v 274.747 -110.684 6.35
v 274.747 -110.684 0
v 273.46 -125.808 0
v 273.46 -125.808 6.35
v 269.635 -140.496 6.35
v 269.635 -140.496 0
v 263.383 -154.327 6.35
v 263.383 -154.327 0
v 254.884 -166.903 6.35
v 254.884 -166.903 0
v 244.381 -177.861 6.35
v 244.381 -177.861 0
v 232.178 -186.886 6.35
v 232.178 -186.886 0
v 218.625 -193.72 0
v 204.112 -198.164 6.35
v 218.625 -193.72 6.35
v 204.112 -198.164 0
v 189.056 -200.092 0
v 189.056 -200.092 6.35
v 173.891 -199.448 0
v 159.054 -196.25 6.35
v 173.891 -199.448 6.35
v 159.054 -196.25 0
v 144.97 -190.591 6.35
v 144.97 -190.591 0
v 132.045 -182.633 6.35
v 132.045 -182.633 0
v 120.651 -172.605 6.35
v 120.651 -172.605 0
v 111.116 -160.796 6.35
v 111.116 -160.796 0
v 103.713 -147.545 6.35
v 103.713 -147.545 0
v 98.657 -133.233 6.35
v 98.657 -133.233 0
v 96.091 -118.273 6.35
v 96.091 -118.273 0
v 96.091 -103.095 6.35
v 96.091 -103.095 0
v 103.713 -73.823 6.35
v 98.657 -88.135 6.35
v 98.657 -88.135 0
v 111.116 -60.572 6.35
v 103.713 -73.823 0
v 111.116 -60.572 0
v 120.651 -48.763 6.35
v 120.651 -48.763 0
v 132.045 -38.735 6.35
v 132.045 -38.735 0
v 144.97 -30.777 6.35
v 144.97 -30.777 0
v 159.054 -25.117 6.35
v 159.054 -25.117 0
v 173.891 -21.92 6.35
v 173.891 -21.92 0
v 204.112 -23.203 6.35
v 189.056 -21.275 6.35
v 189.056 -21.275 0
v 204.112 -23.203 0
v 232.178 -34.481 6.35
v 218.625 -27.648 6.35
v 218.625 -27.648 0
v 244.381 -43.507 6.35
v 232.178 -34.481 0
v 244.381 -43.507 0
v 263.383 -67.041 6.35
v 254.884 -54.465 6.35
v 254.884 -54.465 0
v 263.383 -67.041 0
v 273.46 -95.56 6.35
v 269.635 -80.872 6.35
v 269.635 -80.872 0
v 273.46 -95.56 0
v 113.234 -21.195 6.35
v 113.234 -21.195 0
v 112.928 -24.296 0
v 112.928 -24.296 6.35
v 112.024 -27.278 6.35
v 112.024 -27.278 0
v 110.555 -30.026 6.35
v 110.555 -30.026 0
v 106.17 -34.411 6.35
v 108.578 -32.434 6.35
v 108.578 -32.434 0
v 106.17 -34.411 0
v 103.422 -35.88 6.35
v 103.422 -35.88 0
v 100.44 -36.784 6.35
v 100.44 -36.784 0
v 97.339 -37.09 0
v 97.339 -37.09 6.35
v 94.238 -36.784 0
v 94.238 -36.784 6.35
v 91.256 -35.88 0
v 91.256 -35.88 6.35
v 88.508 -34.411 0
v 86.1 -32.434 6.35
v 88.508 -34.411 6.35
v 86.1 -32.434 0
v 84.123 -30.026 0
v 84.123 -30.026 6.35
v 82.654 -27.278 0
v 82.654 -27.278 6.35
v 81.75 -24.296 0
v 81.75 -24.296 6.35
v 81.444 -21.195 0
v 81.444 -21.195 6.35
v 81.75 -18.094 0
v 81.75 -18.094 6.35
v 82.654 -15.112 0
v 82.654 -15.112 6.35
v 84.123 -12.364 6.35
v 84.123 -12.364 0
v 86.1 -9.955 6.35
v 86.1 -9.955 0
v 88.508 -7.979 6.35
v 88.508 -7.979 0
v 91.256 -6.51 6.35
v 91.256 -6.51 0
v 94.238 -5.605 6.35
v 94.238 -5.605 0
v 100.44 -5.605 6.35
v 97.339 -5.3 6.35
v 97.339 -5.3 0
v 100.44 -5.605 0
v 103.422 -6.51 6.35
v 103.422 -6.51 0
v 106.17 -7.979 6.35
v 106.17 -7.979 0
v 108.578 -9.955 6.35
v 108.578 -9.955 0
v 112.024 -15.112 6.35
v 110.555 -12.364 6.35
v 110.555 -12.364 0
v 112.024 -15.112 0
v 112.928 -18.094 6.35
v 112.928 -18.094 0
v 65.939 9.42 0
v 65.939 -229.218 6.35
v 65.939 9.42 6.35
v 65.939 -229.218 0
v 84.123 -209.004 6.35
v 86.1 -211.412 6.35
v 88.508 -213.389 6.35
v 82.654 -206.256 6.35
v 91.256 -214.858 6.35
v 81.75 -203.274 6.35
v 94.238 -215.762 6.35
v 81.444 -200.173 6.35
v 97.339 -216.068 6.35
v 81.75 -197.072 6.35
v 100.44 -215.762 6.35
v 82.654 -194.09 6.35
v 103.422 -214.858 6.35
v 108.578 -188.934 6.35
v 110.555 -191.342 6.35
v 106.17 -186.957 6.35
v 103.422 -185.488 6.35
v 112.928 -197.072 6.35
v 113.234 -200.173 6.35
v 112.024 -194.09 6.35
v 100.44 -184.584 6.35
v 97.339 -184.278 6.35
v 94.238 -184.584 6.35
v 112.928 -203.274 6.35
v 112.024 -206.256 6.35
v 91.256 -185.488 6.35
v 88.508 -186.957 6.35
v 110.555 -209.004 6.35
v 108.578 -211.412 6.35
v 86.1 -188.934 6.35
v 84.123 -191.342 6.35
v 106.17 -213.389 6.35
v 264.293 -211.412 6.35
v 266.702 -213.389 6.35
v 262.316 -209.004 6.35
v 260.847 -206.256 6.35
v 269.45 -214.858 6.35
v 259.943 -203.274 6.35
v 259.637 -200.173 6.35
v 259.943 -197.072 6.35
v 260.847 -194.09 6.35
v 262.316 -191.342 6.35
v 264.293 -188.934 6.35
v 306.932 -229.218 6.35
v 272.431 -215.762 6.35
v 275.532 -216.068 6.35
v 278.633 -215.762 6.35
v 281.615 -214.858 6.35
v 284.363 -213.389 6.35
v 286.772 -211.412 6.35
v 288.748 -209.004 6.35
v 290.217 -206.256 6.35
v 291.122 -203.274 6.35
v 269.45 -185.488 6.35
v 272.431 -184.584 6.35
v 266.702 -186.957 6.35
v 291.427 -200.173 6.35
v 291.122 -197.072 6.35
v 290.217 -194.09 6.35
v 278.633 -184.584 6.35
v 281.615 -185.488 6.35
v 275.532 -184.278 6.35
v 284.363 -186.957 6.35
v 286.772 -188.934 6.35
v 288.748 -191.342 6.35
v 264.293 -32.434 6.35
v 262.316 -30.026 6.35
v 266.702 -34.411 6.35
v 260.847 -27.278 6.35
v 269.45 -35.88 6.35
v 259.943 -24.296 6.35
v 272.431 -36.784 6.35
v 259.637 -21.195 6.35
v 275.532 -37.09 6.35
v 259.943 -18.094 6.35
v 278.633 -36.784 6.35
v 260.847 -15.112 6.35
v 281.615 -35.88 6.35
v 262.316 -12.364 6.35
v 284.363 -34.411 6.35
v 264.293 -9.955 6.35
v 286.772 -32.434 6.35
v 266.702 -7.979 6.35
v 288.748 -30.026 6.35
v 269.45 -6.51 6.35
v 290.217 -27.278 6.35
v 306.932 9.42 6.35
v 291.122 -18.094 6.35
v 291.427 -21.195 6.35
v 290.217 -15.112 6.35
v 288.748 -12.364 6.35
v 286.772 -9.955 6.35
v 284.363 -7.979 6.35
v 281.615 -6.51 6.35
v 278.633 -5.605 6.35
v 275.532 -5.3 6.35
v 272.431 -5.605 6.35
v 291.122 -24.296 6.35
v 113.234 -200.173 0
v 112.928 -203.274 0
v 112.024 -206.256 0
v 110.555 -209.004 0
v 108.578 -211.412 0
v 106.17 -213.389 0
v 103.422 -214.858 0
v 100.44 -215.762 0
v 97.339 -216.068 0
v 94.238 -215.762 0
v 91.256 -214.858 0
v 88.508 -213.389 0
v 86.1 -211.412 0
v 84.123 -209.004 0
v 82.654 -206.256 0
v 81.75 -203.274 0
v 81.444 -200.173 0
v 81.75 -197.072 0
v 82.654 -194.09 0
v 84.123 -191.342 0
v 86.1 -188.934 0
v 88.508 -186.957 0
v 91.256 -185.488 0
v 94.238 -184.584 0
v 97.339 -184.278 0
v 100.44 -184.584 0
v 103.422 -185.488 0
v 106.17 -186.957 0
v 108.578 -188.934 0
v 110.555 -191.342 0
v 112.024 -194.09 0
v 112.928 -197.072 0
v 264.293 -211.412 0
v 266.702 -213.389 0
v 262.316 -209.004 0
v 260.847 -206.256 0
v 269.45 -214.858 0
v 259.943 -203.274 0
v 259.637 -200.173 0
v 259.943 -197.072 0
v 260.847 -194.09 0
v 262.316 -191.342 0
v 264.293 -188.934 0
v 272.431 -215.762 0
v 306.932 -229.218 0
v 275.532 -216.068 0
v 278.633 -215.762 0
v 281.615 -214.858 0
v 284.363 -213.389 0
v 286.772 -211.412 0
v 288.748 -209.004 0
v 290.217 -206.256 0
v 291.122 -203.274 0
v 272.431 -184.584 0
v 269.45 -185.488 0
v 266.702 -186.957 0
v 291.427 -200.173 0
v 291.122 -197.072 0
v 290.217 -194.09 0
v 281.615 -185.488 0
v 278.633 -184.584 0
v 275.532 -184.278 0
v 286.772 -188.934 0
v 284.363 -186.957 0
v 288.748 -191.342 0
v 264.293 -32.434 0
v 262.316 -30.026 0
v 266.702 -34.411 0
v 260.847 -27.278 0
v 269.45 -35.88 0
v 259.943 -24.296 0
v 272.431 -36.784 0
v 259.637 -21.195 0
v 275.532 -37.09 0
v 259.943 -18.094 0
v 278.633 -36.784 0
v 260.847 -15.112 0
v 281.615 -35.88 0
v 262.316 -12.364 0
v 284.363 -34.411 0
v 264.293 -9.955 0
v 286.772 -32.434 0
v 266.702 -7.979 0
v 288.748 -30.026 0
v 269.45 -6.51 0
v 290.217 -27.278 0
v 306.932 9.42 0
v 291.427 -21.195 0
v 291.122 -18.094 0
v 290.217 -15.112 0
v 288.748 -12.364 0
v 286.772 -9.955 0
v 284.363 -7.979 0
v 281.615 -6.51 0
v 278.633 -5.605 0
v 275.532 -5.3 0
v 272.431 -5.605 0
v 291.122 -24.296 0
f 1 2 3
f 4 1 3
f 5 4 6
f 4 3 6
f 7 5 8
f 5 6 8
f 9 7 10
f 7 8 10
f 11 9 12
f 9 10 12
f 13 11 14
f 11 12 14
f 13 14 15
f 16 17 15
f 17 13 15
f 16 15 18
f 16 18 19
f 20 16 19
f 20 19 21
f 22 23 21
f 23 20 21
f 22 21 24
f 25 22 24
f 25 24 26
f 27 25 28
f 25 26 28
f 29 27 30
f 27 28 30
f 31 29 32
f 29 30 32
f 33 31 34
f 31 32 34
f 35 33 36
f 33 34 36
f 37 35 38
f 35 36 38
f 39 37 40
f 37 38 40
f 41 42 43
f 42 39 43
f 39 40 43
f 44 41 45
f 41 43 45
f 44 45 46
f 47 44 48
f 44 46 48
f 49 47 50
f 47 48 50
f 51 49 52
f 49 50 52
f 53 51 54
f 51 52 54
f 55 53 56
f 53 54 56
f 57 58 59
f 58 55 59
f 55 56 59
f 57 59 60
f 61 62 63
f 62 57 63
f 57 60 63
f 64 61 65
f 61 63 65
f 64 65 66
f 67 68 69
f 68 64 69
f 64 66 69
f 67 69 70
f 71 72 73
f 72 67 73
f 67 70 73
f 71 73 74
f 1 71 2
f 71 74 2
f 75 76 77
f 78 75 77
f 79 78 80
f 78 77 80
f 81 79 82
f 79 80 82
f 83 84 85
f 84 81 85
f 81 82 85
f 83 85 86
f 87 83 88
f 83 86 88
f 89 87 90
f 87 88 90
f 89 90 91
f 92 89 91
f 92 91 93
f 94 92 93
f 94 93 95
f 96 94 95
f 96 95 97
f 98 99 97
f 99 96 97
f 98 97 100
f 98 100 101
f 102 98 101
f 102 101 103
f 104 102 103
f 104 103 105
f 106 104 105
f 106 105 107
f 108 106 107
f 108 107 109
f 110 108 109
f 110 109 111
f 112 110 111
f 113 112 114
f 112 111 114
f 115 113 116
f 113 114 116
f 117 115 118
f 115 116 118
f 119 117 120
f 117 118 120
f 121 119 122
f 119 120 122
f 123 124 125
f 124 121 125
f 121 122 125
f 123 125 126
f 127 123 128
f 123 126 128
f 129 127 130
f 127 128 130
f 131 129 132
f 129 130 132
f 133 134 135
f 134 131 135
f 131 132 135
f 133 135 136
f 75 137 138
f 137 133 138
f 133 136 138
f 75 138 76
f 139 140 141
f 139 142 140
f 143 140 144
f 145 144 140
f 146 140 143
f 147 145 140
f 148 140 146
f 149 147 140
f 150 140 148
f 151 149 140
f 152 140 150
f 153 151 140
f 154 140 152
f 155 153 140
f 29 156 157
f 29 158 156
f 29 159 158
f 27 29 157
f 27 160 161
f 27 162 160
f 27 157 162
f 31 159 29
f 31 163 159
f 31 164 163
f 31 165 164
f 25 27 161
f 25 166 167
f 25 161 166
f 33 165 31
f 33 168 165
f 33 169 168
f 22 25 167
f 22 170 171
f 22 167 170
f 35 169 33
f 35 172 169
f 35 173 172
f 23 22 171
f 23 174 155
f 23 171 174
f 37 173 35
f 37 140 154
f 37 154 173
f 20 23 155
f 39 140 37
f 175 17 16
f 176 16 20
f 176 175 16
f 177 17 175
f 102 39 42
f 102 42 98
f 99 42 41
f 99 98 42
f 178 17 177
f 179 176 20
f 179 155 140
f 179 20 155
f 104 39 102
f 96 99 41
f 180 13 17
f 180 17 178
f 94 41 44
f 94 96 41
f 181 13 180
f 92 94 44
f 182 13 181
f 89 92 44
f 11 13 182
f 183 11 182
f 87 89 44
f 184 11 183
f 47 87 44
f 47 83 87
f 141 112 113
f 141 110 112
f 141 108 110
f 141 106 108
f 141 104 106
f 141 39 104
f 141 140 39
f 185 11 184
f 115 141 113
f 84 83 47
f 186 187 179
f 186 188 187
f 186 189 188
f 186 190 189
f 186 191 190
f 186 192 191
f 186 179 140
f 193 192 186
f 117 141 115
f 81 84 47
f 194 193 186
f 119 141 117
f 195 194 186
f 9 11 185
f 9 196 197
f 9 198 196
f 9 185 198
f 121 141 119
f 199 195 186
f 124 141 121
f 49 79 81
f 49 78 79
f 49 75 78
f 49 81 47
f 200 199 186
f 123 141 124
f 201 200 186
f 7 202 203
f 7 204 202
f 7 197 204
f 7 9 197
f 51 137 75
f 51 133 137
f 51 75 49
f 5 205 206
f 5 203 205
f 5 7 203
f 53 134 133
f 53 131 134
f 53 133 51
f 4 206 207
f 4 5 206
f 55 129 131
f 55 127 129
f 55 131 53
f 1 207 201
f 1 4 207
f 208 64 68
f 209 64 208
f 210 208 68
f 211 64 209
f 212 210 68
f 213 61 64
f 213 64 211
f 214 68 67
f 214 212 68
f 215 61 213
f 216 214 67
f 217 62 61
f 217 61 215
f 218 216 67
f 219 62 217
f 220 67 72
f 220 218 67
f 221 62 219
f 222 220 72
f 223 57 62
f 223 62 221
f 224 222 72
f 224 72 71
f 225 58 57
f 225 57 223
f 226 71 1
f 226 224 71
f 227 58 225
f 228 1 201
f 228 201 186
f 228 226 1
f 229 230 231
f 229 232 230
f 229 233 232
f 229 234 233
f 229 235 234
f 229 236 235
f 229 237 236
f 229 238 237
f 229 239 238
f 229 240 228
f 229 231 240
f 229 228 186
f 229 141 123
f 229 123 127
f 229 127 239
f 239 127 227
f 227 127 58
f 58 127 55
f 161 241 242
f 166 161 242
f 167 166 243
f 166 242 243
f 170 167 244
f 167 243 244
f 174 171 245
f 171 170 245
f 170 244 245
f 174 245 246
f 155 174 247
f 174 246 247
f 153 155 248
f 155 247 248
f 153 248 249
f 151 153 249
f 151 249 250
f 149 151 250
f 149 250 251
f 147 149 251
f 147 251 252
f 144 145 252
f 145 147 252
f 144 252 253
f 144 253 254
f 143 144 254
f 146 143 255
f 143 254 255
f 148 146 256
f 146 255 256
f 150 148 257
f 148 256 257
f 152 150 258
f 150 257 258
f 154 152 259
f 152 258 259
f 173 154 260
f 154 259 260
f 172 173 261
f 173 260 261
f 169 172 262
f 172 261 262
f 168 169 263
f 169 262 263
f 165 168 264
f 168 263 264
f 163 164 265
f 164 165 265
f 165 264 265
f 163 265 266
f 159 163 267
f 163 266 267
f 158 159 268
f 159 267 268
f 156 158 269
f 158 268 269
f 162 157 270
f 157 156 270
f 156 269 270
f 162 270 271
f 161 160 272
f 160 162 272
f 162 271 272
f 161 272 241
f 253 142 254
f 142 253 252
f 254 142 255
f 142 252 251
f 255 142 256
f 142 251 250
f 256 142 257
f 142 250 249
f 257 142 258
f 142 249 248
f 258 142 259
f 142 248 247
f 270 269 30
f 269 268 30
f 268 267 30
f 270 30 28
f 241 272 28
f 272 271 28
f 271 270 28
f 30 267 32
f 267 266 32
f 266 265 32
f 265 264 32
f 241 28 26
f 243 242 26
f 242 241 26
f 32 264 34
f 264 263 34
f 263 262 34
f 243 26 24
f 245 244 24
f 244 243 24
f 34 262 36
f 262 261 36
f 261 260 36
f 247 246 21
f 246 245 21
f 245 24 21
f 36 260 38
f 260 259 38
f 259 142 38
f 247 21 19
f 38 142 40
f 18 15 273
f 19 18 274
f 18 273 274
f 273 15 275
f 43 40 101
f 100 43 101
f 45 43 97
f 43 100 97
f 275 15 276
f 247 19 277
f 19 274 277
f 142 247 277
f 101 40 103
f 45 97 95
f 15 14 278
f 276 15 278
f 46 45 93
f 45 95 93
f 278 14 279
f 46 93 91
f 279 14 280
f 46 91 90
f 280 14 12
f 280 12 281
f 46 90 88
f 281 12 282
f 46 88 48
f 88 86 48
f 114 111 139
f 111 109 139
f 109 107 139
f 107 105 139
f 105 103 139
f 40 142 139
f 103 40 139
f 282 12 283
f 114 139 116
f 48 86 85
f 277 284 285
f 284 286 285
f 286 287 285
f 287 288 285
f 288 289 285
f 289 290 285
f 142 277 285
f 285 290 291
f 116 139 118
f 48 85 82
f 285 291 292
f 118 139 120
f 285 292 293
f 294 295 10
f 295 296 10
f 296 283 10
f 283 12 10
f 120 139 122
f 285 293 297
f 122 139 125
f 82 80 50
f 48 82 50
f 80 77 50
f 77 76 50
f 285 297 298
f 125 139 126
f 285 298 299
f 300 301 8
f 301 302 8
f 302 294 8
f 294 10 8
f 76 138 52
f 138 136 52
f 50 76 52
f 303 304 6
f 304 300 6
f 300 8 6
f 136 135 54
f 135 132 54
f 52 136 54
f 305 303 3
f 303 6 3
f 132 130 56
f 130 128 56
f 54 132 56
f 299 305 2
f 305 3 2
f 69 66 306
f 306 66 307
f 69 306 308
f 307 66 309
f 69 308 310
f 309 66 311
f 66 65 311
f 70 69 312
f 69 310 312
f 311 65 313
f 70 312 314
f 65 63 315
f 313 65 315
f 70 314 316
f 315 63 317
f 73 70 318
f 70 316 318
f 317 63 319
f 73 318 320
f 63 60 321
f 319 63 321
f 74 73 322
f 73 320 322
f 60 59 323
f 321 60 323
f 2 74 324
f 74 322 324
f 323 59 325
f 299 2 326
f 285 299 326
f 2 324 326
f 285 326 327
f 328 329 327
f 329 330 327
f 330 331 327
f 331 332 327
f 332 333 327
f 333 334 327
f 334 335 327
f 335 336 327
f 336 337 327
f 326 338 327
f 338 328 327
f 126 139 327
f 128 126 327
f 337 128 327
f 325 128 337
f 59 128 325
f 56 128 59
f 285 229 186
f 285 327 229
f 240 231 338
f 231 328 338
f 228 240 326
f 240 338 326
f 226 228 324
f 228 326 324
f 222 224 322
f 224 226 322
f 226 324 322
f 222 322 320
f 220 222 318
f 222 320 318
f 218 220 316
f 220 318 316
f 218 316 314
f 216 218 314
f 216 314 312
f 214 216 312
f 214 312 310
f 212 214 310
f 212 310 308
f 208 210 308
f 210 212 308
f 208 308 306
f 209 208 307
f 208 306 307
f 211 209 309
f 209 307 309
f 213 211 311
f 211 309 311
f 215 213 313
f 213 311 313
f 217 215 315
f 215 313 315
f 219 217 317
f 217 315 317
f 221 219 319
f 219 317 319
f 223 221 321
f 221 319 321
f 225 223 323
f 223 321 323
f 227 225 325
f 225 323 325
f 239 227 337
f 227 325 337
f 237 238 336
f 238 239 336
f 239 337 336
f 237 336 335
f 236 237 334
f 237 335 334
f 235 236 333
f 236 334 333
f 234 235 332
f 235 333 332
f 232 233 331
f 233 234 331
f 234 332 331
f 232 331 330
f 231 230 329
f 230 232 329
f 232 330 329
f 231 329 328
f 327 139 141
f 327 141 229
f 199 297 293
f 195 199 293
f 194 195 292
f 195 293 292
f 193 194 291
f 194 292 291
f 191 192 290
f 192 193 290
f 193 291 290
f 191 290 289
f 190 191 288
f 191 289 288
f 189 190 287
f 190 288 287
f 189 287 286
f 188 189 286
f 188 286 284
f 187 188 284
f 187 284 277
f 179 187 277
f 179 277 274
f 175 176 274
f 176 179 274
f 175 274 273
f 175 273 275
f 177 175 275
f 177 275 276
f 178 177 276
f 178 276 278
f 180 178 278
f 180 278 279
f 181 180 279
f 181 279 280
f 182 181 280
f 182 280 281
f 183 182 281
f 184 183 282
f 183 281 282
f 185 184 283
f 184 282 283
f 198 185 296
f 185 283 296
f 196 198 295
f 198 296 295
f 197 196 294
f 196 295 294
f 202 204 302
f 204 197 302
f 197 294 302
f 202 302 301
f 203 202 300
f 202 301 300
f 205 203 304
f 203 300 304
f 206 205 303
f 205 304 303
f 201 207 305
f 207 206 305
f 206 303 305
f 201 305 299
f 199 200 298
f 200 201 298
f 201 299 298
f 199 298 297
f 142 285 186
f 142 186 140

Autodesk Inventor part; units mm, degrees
ref_plane "YZ Plane" through (0, 0, 0) normal (1, 0, 0) x (0, 1, 0)
ref_plane "XZ Plane" through (0, 0, 0) normal (0, 1, 0) x (-1, 0, 0)
ref_plane "XY Plane" through (0, 0, 0) normal (0, 0, 1) x (1, 0, 0)
sketch "Sketch1" plane through (0, 0, 0) normal (0, 0, 1) x (1, 0, 0)
  line L0 (-28.9445, 15.5893) -> (396.7701, 15.5893) construction
  line L1 (396.7701, 15.5893) -> (396.7701, -233.6482) construction
  line L2 (396.7701, -233.6482) -> (-28.9445, -233.6482) construction
  line L3 (-28.9445, -233.6482) -> (-28.9445, 15.5893) construction
  line L4 (-26.909, 14.1495) -> (398.8056, 14.1495) construction
  line L5 (398.8056, 14.1495) -> (398.8056, -235.0879) construction
  line L6 (398.8056, -235.0879) -> (-26.909, -235.0879) construction
  line L7 (-26.909, -235.0879) -> (-26.909, 14.1495) construction
  point P0 (0, 0)
sketch "Sketch2" plane through (0, 0, 0) normal (0, 0, 1) x (1, 0, 0)
  circle A0 centre (97.339, -21.1948) radius 15.8949
  circle A1 centre (275.5323, -21.1948) radius 15.8949
  circle A2 centre (275.5323, -200.173) radius 15.8949
  circle A3 centre (97.339, -200.173) radius 15.8949
  circle A4 centre (185.2582, -110.6839) radius 89.4891
  line L0 (65.9394, 9.4199) -> (306.932, 9.4199)
  line L1 (306.932, 9.4199) -> (306.932, -229.2178)
  line L2 (306.932, -229.2178) -> (65.9394, -229.2178)
  line L3 (65.9394, -229.2178) -> (65.9394, 9.4199)
  point P0 (0, 0)
extrude "Extrusion1" add sketch "Sketch2" along normal blind 6.35
properties part number "Ball grabber bearing mount2"
